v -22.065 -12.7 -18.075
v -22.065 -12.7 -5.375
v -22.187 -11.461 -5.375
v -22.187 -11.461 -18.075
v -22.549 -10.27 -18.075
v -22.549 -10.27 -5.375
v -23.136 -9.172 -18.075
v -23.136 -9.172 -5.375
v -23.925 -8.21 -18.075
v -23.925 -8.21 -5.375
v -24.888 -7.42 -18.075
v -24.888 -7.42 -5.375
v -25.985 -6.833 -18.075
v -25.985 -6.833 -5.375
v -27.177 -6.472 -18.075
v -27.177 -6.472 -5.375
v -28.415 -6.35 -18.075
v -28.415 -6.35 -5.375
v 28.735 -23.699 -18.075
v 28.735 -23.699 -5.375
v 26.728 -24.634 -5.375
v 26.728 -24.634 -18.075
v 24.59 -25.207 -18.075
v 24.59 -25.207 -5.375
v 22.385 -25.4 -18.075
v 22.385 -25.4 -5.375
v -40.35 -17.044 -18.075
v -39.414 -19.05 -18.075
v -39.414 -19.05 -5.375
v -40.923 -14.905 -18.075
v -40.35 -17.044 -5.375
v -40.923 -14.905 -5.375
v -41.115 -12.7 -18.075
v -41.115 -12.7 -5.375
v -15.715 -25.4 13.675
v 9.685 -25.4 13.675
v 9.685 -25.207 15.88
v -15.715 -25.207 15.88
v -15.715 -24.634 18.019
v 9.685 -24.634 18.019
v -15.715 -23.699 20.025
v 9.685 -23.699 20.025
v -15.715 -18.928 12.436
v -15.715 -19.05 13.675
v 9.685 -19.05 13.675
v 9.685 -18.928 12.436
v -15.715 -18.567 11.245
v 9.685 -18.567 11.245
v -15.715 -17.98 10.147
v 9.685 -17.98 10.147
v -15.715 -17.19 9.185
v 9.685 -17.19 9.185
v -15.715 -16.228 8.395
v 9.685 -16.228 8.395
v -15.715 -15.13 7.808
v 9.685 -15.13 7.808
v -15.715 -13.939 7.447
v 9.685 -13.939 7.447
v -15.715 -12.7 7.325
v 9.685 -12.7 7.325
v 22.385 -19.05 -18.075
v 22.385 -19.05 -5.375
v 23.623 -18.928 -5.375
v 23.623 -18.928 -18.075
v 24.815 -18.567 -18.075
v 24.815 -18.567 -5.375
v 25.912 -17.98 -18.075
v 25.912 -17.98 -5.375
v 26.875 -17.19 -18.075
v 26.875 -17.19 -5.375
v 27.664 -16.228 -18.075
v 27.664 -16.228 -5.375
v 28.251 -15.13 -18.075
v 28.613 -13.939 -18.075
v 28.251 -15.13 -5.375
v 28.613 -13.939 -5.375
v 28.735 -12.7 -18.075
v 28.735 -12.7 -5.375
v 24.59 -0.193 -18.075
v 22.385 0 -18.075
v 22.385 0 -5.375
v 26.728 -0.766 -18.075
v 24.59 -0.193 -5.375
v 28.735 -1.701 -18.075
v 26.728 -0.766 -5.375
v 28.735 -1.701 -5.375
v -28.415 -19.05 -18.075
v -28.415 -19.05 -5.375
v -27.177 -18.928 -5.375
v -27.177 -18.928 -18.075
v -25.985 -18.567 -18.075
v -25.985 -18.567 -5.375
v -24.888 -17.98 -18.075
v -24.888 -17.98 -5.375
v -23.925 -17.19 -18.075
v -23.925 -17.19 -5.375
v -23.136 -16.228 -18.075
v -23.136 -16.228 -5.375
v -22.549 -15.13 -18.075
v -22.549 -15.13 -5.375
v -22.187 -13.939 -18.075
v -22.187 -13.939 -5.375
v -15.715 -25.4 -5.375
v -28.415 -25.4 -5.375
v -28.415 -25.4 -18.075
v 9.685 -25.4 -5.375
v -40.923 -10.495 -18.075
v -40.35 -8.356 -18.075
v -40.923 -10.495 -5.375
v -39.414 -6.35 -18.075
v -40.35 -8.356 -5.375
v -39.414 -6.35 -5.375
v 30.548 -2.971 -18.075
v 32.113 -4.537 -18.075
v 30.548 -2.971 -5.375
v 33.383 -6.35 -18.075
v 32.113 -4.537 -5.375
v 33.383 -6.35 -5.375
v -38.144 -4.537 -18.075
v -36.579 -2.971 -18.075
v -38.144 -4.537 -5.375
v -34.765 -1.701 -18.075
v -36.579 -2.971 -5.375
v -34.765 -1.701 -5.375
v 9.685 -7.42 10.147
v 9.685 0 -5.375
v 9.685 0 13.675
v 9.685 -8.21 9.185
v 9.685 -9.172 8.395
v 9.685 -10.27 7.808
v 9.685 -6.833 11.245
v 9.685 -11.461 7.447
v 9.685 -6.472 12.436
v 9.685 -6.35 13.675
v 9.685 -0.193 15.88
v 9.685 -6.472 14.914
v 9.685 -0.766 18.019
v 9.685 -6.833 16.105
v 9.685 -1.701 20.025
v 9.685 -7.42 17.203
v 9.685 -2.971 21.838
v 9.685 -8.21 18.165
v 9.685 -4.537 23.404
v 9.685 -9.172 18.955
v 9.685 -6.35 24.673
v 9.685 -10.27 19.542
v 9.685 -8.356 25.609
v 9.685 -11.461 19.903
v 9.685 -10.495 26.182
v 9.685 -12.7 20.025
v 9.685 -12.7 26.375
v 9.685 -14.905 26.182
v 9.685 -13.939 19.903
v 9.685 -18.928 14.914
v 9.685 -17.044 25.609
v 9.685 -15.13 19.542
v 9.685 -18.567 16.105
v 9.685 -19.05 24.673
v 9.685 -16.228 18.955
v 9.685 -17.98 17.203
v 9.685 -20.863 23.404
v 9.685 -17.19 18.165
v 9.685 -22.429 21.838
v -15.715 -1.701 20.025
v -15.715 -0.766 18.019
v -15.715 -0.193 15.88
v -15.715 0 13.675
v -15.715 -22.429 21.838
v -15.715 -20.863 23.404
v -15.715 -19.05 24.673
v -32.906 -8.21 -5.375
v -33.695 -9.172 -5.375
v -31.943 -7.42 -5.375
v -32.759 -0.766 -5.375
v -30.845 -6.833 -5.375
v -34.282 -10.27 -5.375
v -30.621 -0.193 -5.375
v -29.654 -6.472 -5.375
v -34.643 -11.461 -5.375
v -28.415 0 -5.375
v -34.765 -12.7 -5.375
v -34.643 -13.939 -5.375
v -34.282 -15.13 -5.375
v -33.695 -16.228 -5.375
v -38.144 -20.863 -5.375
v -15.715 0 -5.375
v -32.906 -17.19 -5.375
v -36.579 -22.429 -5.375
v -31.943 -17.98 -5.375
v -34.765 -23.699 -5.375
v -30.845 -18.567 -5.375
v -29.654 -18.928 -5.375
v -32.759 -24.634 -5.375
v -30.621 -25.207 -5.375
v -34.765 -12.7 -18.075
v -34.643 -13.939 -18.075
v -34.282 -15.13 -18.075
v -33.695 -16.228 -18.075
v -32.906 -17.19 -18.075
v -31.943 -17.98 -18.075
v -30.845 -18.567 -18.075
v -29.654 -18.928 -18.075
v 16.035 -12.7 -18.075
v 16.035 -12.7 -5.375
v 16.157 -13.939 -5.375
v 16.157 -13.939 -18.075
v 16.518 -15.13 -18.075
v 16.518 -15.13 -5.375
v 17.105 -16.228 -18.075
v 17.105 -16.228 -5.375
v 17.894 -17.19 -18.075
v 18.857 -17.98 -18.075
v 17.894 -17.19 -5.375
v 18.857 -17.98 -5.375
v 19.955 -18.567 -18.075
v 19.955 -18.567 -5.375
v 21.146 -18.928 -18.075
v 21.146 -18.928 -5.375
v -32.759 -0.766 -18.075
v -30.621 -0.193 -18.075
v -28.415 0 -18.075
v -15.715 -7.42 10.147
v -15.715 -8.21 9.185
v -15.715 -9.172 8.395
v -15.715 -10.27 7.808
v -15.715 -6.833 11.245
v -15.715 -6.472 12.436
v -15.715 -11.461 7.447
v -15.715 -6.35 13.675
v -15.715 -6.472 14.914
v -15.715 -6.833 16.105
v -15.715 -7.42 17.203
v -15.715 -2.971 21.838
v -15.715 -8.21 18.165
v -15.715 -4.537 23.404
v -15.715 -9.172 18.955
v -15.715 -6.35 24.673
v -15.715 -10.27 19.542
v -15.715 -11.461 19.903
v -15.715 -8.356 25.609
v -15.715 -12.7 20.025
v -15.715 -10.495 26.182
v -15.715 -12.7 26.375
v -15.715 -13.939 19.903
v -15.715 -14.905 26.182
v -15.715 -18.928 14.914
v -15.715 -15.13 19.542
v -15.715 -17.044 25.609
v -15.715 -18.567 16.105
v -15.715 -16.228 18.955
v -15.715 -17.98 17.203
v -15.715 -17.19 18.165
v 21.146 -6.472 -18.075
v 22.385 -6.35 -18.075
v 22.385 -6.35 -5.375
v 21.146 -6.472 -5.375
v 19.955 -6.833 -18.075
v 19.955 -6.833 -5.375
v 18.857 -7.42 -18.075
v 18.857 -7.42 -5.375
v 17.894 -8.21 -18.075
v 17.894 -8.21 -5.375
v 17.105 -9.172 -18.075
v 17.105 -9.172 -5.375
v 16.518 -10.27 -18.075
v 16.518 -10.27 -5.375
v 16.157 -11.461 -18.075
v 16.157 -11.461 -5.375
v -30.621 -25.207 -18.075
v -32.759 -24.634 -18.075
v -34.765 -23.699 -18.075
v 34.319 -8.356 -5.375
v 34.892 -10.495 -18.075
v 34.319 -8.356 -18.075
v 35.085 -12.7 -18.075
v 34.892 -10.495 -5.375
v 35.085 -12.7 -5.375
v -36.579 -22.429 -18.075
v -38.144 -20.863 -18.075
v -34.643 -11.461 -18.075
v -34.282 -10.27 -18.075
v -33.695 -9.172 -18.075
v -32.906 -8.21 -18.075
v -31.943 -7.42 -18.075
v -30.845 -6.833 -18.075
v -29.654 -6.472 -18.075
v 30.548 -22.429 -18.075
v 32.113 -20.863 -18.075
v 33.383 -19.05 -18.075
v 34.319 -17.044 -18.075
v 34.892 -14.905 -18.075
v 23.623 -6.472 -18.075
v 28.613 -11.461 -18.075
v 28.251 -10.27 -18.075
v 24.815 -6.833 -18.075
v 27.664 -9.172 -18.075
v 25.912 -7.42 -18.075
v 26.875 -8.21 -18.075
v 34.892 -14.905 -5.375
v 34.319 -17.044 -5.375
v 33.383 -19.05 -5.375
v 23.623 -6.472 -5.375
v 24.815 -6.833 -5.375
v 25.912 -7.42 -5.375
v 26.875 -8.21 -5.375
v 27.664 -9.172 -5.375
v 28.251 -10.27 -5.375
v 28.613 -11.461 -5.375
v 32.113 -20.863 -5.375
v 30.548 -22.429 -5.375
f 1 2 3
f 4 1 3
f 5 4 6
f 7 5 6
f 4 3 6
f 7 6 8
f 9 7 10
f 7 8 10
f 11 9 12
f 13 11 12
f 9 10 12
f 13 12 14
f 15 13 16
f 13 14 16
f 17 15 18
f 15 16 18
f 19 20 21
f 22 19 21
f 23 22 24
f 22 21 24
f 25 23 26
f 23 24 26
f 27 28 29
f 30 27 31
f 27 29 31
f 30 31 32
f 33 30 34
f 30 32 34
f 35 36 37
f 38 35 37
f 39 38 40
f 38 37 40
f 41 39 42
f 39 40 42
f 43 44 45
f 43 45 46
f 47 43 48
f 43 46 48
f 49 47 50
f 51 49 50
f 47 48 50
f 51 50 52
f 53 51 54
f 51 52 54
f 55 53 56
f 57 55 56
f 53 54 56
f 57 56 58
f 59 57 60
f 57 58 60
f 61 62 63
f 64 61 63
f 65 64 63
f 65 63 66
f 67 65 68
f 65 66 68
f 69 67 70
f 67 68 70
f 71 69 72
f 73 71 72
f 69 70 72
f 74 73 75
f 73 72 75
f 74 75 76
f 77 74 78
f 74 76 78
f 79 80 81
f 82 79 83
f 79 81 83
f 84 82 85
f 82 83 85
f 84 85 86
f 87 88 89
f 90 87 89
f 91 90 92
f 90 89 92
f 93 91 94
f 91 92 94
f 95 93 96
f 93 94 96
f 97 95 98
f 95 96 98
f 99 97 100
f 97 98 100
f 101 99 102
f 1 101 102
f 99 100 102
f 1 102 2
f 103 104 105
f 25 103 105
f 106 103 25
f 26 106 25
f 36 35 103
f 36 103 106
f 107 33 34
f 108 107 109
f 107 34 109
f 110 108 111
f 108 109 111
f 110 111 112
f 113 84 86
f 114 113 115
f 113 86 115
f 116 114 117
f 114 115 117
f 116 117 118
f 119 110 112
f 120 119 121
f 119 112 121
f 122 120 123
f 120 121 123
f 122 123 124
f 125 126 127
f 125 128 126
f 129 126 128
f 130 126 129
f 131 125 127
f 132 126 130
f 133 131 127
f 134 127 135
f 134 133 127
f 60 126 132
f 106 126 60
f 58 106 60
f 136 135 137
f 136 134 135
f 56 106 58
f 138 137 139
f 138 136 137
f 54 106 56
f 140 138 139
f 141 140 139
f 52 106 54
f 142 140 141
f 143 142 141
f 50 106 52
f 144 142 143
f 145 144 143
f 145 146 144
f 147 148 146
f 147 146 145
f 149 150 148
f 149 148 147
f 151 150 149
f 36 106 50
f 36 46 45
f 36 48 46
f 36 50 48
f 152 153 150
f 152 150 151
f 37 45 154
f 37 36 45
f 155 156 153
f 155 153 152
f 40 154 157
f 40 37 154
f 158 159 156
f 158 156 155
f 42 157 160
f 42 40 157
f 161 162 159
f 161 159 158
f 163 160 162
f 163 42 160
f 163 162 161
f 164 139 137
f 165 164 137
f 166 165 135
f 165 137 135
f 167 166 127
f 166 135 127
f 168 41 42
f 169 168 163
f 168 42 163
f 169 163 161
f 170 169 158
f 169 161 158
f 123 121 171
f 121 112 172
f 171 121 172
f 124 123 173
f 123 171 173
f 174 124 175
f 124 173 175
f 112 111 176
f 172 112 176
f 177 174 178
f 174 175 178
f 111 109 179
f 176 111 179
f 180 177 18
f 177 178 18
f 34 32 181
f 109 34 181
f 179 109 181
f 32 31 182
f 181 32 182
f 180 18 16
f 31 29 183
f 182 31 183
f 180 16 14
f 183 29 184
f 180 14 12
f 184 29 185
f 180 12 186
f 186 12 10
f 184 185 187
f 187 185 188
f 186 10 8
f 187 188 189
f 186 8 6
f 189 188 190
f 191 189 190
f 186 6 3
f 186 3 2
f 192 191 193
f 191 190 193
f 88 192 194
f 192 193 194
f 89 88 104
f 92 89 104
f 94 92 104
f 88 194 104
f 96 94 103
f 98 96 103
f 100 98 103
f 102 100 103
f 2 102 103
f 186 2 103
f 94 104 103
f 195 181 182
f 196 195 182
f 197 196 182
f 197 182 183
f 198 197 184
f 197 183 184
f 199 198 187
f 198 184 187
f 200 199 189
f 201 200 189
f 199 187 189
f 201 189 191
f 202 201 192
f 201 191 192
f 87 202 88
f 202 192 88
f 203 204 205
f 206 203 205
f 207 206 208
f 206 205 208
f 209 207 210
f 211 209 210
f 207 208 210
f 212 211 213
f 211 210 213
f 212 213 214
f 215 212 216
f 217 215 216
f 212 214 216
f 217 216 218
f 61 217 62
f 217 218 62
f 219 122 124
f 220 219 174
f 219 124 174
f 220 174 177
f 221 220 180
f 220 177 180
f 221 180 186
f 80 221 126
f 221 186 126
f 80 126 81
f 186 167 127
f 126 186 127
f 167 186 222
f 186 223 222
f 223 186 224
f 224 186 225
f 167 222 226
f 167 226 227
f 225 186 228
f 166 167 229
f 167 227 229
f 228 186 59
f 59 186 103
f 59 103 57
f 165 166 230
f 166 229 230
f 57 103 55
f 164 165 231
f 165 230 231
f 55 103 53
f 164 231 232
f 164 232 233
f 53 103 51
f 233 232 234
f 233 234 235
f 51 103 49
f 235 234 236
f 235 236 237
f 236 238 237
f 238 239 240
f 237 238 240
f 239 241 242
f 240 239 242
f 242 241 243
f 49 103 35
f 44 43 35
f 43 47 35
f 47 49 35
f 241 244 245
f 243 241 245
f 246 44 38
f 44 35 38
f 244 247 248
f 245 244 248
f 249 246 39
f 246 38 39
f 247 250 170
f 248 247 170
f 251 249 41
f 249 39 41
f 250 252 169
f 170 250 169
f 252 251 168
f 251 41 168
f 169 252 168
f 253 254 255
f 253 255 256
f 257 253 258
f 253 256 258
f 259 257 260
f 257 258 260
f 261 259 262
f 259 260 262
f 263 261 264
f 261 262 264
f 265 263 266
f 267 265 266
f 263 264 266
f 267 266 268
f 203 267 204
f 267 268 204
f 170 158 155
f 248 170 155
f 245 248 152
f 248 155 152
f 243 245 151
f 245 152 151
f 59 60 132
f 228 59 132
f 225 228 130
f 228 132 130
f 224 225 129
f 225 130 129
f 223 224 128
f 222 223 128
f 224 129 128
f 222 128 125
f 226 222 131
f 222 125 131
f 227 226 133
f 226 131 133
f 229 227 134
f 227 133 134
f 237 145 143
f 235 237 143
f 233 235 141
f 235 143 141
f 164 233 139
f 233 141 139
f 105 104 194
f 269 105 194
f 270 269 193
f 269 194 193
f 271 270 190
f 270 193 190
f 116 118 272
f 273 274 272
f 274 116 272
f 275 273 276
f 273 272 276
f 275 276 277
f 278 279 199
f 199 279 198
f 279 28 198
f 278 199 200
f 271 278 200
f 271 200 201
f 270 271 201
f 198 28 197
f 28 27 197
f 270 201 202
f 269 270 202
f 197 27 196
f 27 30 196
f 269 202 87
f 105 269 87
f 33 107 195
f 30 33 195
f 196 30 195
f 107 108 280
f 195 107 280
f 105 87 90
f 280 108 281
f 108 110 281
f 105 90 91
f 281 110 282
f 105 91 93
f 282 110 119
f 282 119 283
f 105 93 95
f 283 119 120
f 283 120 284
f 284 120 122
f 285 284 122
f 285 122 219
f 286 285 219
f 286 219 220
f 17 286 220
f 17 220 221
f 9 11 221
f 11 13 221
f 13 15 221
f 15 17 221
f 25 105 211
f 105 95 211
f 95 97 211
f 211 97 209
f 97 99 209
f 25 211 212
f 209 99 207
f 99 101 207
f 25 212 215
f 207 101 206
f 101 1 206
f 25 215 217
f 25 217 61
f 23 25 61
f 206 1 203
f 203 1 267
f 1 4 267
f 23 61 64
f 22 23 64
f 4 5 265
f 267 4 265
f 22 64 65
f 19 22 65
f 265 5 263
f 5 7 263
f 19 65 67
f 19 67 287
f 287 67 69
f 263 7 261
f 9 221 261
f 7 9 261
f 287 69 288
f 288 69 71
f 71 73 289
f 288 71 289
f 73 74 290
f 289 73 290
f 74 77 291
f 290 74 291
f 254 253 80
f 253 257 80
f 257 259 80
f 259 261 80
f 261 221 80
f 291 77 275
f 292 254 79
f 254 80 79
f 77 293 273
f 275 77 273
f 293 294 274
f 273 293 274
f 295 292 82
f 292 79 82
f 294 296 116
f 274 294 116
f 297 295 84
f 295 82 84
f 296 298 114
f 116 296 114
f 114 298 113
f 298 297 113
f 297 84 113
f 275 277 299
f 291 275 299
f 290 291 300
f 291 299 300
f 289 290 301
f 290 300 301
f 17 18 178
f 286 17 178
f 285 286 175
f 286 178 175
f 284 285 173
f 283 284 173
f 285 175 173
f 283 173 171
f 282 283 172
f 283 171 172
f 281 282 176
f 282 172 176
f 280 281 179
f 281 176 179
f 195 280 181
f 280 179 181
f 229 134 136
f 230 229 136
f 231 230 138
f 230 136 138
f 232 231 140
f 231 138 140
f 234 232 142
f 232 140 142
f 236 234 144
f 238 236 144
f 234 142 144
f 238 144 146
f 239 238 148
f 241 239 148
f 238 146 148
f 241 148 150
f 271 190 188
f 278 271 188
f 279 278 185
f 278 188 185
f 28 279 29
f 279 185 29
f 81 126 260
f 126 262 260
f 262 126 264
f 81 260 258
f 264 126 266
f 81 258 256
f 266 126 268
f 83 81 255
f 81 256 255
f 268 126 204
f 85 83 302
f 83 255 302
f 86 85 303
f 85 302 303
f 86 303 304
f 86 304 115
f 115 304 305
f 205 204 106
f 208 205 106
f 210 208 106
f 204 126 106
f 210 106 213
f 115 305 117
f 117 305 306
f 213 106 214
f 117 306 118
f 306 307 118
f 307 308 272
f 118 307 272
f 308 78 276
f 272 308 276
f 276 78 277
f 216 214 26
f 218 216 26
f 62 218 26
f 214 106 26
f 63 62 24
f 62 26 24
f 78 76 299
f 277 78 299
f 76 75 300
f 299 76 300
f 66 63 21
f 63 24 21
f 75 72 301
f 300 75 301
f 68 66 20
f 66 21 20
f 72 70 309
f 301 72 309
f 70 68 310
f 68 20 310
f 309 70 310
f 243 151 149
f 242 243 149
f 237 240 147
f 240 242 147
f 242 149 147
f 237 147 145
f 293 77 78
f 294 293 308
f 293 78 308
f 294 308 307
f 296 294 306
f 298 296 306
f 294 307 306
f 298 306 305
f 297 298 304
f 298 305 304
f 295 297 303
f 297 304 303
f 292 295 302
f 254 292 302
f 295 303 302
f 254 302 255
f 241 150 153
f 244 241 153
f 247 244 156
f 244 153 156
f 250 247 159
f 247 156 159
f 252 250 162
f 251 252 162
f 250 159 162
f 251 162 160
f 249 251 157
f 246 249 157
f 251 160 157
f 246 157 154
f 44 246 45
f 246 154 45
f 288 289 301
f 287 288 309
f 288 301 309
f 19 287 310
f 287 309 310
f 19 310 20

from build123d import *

# Parameters (mm, degrees)
F0_W     = 76.2
F0_H     = 44.45
F1_DEPTH = 25.4
F2_W     = 25.4
F2_H     = 31.75
F3_DEPTH = 25.401
F5_DEPTH = 50.801
F7_DEPTH = 12.701
F9_DEPTH = 12.701


with BuildPart() as f1:
    # F0 (on Front) → F1 (new body)
    with BuildSketch(Plane.XZ):
        with Locations((-3.0154539272, 4.1499344332)):
            Rectangle(F0_W, F0_H)
    extrude(amount=F1_DEPTH)

    # F2 (on face) → F3 (cut, through all)
    with BuildSketch(Plane.XZ.offset(25.4)):
        with Locations((-28.4154539272, 10.4999344332)):
            Rectangle(F2_W, F2_H)
        with Locations((22.3845460728, 10.4999344332)):
            Rectangle(F2_W, F2_H)
    extrude(amount=-F3_DEPTH, mode=Mode.SUBTRACT)

    # F4 (on face) → F5 (cut, through all)
    with BuildSketch(Plane.YZ.offset(9.6845460728)):
        with BuildLine():
            ThreePointArc((-12.7, 20.0249344332), (-17.1901280646, 18.1650624897), (-19.05, 13.6749344217))
            Line((-19.05, 13.6749344332), (-6.35, 13.6749344332))
            ThreePointArc((-6.35, 13.6749344332), (-8.2098719395, 18.1650624937), (-12.7, 20.0249344332))
        make_face()
        with BuildLine():
            Line((-6.35, 13.6749344332), (-19.05, 13.6749344332))
            ThreePointArc((-19.05, 13.6749344217), (-17.1901280565, 9.1848063686), (-12.7, 7.3249344332))
            ThreePointArc((-12.7, 7.3249344332), (-8.2098719395, 9.1848063726), (-6.35, 13.6749344332))
        make_face()
        with BuildLine():
            Line((-6.35, 26.3749344332), (-6.35, 24.6734570612))
            ThreePointArc((-6.35, 24.6734570612), (-3.7197438789, 22.6551905542), (-1.7014773719, 20.0249344332))
            Line((-1.7014773719, 20.0249344332), (0, 20.0249344332))
            Line((0, 20.0249344332), (0, 26.3749344332))
            Line((0, 26.3749344332), (-6.35, 26.3749344332))
        make_face()
        with BuildLine():
            Line((-25.4, 26.3749344332), (-25.4, 20.0249344332))
            Line((-25.4, 20.0249344332), (-23.6985226281, 20.0249344332))
            ThreePointArc((-23.6985226281, 20.0249344332), (-21.6802561211, 22.6551905542), (-19.05, 24.6734570612))
            Line((-19.05, 24.6734570612), (-19.05, 26.3749344332))
            Line((-19.05, 26.3749344332), (-25.4, 26.3749344332))
        make_face()
        with BuildLine():
            Line((-19.05, 26.3749344332), (-19.05, 24.6734570612))
            ThreePointArc((-19.05, 24.6734570612), (-15.9870018728, 25.942192427), (-12.7, 26.3749344332))
            Line((-12.7, 26.3749344332), (-19.05, 26.3749344332))
        make_face()
        with BuildLine():
            Line((-6.35, 26.3749344332), (-12.7, 26.3749344332))
            ThreePointArc((-12.7, 26.3749344332), (-9.4129981272, 25.942192427), (-6.35, 24.6734570612))
            Line((-6.35, 24.6734570612), (-6.35, 26.3749344332))
        make_face()
        with BuildLine():
            Line((-23.6985226281, 20.0249344332), (-25.4, 20.0249344332))
            Line((-25.4, 20.0249344332), (-25.4, 13.6749344332))
            ThreePointArc((-25.4, 13.6749344332), (-24.9672579939, 16.961936306), (-23.6985226281, 20.0249344332))
        make_face()
        with BuildLine():
            ThreePointArc((-1.7014773719, 20.0249344332), (-0.4327420061, 16.961936306), (0, 13.6749344332))
            Line((0, 13.6749344332), (0, 20.0249344332))
            Line((0, 20.0249344332), (-1.7014773719, 20.0249344332))
        make_face()
    extrude(amount=-F5_DEPTH, mode=Mode.SUBTRACT)

    # F6 (on face) → F7 (cut, through all)
    with BuildSketch(Plane.XY.offset(-5.3750655668)):
        with BuildLine():
            ThreePointArc((-22.0654539272, -12.7), (-23.9253258667, -8.2098719395), (-28.4154539272, -6.35))
            Line((-28.4154539272, -6.35), (-28.4154539272, -19.05))
            ThreePointArc((-28.4154539272, -19.05), (-23.9253258667, -17.1901280605), (-22.0654539272, -12.7))
        make_face()
        with BuildLine():
            Line((-28.4154539272, -19.05), (-28.4154539272, -6.35))
            ThreePointArc((-28.4154539272, -6.35), (-32.9055819878, -8.2098719395), (-34.7654539272, -12.7))
            ThreePointArc((-34.7654539272, -12.7), (-32.9055819878, -17.1901280605), (-28.4154539272, -19.05))
        make_face()
        with BuildLine():
            Line((-34.7654539272, -1.7014773719), (-34.7654539272, 0))
            Line((-34.7654539272, 0), (-41.1154539272, 0))
            Line((-41.1154539272, 0), (-41.1154539272, -6.35))
            Line((-41.1154539272, -6.35), (-39.4139765553, -6.35))
            ThreePointArc((-39.4139765553, -6.35), (-37.3957100483, -3.7197438789), (-34.7654539272, -1.7014773719))
        make_face()
        with BuildLine():
            ThreePointArc((-41.1154539272, -12.7), (-40.6827119211, -9.4129981272), (-39.4139765553, -6.35))
            Line((-39.4139765553, -6.35), (-41.1154539272, -6.35))
            Line((-41.1154539272, -6.35), (-41.1154539272, -12.7))
        make_face()
        with BuildLine():
            Line((-28.4154539272, 0), (-34.7654539272, 0))
            Line((-34.7654539272, 0), (-34.7654539272, -1.7014773719))
            ThreePointArc((-34.7654539272, -1.7014773719), (-31.7024558, -0.4327420061), (-28.4154539272, 0))
        make_face()
        with BuildLine():
            ThreePointArc((-39.4139765553, -19.05), (-40.6827119211, -15.9870018728), (-41.1154539272, -12.7))
            Line((-41.1154539272, -12.7), (-41.1154539272, -19.05))
            Line((-41.1154539272, -19.05), (-39.4139765553, -19.05))
        make_face()
        with BuildLine():
            ThreePointArc((-34.7654539272, -23.6985226281), (-37.3957100483, -21.6802561211), (-39.4139765553, -19.05))
            Line((-39.4139765553, -19.05), (-41.1154539272, -19.05))
            Line((-41.1154539272, -19.05), (-41.1154539272, -25.4))
            Line((-41.1154539272, -25.4), (-34.7654539272, -25.4))
            Line((-34.7654539272, -25.4), (-34.7654539272, -23.6985226281))
        make_face()
        with BuildLine():
            Line((-34.7654539272, -25.4), (-28.4154539272, -25.4))
            ThreePointArc((-28.4154539272, -25.4), (-31.7024558, -24.9672579939), (-34.7654539272, -23.6985226281))
            Line((-34.7654539272, -23.6985226281), (-34.7654539272, -25.4))
        make_face()
    extrude(amount=-F7_DEPTH, mode=Mode.SUBTRACT)

    # F8 (on face) → F9 (cut, through all)
    with BuildSketch(Plane.XY.offset(-5.3750655668)):
        with BuildLine():
            ThreePointArc((28.7345460728, -12.7), (26.8746741333, -8.2098719395), (22.3845460728, -6.35))
            Line((22.3845460728, -6.35), (22.3845460728, -19.05))
            ThreePointArc((22.3845460728, -19.05), (26.8746741333, -17.1901280605), (28.7345460728, -12.7))
        make_face()
        with BuildLine():
            ThreePointArc((22.3845460728, -6.35), (17.8944180122, -8.2098719395), (16.0345460728, -12.7))
            ThreePointArc((16.0345460728, -12.7), (17.8944180122, -17.1901280605), (22.3845460728, -19.05))
            Line((22.3845460728, -19.05), (22.3845460728, -6.35))
        make_face()
        with BuildLine():
            ThreePointArc((28.7345460728, -23.6985226281), (25.6715479456, -24.9672579939), (22.3845460728, -25.4))
            Line((22.3845460728, -25.4), (28.7345460728, -25.4))
            Line((28.7345460728, -25.4), (28.7345460728, -23.6985226281))
        make_face()
        with BuildLine():
            ThreePointArc((33.3830687008, -19.05), (31.3648021939, -21.6802561211), (28.7345460728, -23.6985226281))
            Line((28.7345460728, -23.6985226281), (28.7345460728, -25.4))
            Line((28.7345460728, -25.4), (35.0845460728, -25.4))
            Line((35.0845460728, -25.4), (35.0845460728, -19.05))
            Line((35.0845460728, -19.05), (33.3830687008, -19.05))
        make_face()
        with BuildLine():
            Line((35.0845460728, -19.05), (35.0845460728, -12.7))
            ThreePointArc((35.0845460728, -12.7), (34.6518040667, -15.9870018728), (33.3830687008, -19.05))
            Line((33.3830687008, -19.05), (35.0845460728, -19.05))
        make_face()
        with BuildLine():
            Line((35.0845460728, -6.35), (33.3830687008, -6.35))
            ThreePointArc((33.3830687008, -6.35), (34.6518040667, -9.4129981272), (35.0845460728, -12.7))
            Line((35.0845460728, -12.7), (35.0845460728, -6.35))
        make_face()
        with BuildLine():
            Line((28.7345460728, 0), (28.7345460728, -1.7014773719))
            ThreePointArc((28.7345460728, -1.7014773719), (31.3648021939, -3.7197438789), (33.3830687008, -6.35))
            Line((33.3830687008, -6.35), (35.0845460728, -6.35))
            Line((35.0845460728, -6.35), (35.0845460728, 0))
            Line((35.0845460728, 0), (28.7345460728, 0))
        make_face()
        with BuildLine():
            Line((28.7345460728, 0), (22.3845460728, 0))
            ThreePointArc((22.3845460728, 0), (25.6715479456, -0.4327420061), (28.7345460728, -1.7014773719))
            Line((28.7345460728, -1.7014773719), (28.7345460728, 0))
        make_face()
    extrude(amount=-F9_DEPTH, mode=Mode.SUBTRACT)


solid = f1.part
